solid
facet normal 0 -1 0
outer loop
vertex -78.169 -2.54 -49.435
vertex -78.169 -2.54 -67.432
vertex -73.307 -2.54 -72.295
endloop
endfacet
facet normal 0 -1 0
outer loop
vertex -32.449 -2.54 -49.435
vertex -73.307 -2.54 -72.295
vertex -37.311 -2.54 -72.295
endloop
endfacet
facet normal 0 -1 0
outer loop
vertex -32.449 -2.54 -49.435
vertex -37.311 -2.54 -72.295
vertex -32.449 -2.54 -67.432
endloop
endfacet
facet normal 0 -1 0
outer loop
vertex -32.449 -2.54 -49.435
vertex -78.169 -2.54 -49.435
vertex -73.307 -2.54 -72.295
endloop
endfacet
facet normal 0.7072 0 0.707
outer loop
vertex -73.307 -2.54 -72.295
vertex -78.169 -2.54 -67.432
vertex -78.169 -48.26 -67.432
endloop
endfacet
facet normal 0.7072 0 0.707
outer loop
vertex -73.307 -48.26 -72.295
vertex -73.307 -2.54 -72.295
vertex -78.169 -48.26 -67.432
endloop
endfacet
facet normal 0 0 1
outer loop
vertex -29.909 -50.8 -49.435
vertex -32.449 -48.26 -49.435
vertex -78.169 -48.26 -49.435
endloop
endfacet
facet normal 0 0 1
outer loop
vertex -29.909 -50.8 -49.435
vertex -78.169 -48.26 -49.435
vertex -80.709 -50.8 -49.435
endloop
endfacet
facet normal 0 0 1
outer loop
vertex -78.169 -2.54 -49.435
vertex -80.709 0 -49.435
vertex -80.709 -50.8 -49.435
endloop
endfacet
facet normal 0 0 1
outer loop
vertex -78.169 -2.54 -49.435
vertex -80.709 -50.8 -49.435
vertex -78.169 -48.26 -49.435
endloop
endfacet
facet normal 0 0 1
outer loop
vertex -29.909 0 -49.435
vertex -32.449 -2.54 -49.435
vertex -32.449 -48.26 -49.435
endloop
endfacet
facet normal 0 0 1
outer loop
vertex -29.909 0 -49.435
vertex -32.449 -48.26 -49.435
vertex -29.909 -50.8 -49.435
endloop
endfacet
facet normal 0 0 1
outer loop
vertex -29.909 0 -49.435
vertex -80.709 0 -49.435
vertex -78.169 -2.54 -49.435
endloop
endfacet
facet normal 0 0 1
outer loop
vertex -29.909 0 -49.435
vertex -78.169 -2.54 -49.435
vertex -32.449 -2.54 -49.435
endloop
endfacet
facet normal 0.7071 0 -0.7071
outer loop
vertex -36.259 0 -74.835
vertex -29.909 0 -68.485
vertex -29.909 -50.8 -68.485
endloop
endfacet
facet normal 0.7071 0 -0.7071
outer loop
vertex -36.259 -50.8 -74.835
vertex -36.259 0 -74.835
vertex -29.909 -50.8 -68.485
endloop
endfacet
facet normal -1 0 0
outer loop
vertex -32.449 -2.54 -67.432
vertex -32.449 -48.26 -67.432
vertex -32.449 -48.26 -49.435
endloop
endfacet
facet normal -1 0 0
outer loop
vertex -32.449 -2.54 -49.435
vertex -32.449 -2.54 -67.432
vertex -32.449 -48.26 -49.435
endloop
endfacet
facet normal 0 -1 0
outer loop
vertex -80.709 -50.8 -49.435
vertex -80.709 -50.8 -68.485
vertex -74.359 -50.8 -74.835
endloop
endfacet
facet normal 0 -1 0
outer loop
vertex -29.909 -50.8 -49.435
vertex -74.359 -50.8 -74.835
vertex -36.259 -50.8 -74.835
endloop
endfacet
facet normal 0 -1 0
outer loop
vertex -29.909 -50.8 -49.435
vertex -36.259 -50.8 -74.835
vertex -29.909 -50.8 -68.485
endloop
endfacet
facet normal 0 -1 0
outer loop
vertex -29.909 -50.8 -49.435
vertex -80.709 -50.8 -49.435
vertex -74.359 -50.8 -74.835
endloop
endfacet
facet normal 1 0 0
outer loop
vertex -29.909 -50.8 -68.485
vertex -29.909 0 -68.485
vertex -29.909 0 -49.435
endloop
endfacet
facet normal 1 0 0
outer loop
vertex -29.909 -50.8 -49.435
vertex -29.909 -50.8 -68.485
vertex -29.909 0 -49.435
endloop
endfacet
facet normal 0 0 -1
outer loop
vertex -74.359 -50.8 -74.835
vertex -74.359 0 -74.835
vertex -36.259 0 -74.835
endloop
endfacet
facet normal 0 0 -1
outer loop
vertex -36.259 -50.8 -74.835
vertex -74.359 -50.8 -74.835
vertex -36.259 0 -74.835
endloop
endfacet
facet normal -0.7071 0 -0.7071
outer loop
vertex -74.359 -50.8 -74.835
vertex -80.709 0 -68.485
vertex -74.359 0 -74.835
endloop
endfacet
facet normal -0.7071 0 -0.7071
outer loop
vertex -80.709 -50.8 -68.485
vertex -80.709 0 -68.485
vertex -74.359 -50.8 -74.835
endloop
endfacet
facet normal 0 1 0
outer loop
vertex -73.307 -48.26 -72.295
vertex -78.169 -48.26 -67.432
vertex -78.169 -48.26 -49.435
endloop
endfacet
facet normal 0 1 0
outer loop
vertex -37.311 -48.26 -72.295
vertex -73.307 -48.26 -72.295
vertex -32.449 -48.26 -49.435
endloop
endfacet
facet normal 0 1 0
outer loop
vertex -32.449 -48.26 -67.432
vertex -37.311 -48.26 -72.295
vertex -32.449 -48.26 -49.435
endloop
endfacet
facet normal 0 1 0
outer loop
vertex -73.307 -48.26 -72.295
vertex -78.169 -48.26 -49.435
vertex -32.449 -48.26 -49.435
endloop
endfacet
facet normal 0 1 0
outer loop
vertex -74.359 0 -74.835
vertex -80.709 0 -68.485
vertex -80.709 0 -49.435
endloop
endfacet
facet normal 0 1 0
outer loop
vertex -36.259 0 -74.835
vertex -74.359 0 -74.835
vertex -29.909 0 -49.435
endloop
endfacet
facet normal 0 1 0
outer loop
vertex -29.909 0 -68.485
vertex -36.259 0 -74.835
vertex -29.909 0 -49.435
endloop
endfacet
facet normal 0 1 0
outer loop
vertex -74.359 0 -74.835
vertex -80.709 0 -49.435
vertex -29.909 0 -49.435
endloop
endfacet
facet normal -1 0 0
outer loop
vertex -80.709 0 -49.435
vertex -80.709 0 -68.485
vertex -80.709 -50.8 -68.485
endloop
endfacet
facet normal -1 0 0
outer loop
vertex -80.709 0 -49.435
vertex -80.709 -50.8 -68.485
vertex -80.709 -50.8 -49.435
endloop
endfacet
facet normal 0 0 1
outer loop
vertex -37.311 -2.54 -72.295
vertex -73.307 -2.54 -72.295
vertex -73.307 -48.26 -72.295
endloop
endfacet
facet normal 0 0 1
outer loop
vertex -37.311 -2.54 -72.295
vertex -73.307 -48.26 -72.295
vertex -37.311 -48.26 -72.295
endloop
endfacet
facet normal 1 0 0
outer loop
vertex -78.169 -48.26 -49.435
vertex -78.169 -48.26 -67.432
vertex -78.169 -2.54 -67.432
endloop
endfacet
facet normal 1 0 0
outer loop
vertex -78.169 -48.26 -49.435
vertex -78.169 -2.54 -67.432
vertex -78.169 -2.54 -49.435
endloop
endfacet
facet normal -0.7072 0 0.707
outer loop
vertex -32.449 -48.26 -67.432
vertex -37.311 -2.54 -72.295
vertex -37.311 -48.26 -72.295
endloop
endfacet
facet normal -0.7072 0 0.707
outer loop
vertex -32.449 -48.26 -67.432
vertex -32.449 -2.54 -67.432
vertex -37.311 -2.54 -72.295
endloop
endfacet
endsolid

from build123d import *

# Parameters (mm, degrees)
F0_W     = 50.8
F0_H     = 25.4
F1_DEPTH = 50.8
F2_SIZE  = 6.35
F3_SIZE  = 6.35
F4_T     = -2.54


with BuildPart() as f1:
    # F0 (on Front) → F1 (new body)
    with BuildSketch(Plane.XZ):
        with Locations((-55.30939, -62.134533)):
            Rectangle(F0_W, F0_H)
    extrude(amount=F1_DEPTH)

    # F2
    f2_edges = [f1.edges().sort_by_distance(p)[0] for p in [
        (-29.90939, -25.4, -74.834533),
    ]]
    chamfer(f2_edges, length=F2_SIZE)

    # F3
    f3_edges = [f1.edges().sort_by_distance(p)[0] for p in [
        (-80.70939, -25.4, -74.834533),
    ]]
    chamfer(f3_edges, length=F3_SIZE)

    # F4
    f4_openings = [f1.faces().sort_by_distance(p)[0] for p in [
        (-55.30939, -25.4, -49.434533),
    ]]
    offset(amount=F4_T, openings=f4_openings)


solid = f1.part
